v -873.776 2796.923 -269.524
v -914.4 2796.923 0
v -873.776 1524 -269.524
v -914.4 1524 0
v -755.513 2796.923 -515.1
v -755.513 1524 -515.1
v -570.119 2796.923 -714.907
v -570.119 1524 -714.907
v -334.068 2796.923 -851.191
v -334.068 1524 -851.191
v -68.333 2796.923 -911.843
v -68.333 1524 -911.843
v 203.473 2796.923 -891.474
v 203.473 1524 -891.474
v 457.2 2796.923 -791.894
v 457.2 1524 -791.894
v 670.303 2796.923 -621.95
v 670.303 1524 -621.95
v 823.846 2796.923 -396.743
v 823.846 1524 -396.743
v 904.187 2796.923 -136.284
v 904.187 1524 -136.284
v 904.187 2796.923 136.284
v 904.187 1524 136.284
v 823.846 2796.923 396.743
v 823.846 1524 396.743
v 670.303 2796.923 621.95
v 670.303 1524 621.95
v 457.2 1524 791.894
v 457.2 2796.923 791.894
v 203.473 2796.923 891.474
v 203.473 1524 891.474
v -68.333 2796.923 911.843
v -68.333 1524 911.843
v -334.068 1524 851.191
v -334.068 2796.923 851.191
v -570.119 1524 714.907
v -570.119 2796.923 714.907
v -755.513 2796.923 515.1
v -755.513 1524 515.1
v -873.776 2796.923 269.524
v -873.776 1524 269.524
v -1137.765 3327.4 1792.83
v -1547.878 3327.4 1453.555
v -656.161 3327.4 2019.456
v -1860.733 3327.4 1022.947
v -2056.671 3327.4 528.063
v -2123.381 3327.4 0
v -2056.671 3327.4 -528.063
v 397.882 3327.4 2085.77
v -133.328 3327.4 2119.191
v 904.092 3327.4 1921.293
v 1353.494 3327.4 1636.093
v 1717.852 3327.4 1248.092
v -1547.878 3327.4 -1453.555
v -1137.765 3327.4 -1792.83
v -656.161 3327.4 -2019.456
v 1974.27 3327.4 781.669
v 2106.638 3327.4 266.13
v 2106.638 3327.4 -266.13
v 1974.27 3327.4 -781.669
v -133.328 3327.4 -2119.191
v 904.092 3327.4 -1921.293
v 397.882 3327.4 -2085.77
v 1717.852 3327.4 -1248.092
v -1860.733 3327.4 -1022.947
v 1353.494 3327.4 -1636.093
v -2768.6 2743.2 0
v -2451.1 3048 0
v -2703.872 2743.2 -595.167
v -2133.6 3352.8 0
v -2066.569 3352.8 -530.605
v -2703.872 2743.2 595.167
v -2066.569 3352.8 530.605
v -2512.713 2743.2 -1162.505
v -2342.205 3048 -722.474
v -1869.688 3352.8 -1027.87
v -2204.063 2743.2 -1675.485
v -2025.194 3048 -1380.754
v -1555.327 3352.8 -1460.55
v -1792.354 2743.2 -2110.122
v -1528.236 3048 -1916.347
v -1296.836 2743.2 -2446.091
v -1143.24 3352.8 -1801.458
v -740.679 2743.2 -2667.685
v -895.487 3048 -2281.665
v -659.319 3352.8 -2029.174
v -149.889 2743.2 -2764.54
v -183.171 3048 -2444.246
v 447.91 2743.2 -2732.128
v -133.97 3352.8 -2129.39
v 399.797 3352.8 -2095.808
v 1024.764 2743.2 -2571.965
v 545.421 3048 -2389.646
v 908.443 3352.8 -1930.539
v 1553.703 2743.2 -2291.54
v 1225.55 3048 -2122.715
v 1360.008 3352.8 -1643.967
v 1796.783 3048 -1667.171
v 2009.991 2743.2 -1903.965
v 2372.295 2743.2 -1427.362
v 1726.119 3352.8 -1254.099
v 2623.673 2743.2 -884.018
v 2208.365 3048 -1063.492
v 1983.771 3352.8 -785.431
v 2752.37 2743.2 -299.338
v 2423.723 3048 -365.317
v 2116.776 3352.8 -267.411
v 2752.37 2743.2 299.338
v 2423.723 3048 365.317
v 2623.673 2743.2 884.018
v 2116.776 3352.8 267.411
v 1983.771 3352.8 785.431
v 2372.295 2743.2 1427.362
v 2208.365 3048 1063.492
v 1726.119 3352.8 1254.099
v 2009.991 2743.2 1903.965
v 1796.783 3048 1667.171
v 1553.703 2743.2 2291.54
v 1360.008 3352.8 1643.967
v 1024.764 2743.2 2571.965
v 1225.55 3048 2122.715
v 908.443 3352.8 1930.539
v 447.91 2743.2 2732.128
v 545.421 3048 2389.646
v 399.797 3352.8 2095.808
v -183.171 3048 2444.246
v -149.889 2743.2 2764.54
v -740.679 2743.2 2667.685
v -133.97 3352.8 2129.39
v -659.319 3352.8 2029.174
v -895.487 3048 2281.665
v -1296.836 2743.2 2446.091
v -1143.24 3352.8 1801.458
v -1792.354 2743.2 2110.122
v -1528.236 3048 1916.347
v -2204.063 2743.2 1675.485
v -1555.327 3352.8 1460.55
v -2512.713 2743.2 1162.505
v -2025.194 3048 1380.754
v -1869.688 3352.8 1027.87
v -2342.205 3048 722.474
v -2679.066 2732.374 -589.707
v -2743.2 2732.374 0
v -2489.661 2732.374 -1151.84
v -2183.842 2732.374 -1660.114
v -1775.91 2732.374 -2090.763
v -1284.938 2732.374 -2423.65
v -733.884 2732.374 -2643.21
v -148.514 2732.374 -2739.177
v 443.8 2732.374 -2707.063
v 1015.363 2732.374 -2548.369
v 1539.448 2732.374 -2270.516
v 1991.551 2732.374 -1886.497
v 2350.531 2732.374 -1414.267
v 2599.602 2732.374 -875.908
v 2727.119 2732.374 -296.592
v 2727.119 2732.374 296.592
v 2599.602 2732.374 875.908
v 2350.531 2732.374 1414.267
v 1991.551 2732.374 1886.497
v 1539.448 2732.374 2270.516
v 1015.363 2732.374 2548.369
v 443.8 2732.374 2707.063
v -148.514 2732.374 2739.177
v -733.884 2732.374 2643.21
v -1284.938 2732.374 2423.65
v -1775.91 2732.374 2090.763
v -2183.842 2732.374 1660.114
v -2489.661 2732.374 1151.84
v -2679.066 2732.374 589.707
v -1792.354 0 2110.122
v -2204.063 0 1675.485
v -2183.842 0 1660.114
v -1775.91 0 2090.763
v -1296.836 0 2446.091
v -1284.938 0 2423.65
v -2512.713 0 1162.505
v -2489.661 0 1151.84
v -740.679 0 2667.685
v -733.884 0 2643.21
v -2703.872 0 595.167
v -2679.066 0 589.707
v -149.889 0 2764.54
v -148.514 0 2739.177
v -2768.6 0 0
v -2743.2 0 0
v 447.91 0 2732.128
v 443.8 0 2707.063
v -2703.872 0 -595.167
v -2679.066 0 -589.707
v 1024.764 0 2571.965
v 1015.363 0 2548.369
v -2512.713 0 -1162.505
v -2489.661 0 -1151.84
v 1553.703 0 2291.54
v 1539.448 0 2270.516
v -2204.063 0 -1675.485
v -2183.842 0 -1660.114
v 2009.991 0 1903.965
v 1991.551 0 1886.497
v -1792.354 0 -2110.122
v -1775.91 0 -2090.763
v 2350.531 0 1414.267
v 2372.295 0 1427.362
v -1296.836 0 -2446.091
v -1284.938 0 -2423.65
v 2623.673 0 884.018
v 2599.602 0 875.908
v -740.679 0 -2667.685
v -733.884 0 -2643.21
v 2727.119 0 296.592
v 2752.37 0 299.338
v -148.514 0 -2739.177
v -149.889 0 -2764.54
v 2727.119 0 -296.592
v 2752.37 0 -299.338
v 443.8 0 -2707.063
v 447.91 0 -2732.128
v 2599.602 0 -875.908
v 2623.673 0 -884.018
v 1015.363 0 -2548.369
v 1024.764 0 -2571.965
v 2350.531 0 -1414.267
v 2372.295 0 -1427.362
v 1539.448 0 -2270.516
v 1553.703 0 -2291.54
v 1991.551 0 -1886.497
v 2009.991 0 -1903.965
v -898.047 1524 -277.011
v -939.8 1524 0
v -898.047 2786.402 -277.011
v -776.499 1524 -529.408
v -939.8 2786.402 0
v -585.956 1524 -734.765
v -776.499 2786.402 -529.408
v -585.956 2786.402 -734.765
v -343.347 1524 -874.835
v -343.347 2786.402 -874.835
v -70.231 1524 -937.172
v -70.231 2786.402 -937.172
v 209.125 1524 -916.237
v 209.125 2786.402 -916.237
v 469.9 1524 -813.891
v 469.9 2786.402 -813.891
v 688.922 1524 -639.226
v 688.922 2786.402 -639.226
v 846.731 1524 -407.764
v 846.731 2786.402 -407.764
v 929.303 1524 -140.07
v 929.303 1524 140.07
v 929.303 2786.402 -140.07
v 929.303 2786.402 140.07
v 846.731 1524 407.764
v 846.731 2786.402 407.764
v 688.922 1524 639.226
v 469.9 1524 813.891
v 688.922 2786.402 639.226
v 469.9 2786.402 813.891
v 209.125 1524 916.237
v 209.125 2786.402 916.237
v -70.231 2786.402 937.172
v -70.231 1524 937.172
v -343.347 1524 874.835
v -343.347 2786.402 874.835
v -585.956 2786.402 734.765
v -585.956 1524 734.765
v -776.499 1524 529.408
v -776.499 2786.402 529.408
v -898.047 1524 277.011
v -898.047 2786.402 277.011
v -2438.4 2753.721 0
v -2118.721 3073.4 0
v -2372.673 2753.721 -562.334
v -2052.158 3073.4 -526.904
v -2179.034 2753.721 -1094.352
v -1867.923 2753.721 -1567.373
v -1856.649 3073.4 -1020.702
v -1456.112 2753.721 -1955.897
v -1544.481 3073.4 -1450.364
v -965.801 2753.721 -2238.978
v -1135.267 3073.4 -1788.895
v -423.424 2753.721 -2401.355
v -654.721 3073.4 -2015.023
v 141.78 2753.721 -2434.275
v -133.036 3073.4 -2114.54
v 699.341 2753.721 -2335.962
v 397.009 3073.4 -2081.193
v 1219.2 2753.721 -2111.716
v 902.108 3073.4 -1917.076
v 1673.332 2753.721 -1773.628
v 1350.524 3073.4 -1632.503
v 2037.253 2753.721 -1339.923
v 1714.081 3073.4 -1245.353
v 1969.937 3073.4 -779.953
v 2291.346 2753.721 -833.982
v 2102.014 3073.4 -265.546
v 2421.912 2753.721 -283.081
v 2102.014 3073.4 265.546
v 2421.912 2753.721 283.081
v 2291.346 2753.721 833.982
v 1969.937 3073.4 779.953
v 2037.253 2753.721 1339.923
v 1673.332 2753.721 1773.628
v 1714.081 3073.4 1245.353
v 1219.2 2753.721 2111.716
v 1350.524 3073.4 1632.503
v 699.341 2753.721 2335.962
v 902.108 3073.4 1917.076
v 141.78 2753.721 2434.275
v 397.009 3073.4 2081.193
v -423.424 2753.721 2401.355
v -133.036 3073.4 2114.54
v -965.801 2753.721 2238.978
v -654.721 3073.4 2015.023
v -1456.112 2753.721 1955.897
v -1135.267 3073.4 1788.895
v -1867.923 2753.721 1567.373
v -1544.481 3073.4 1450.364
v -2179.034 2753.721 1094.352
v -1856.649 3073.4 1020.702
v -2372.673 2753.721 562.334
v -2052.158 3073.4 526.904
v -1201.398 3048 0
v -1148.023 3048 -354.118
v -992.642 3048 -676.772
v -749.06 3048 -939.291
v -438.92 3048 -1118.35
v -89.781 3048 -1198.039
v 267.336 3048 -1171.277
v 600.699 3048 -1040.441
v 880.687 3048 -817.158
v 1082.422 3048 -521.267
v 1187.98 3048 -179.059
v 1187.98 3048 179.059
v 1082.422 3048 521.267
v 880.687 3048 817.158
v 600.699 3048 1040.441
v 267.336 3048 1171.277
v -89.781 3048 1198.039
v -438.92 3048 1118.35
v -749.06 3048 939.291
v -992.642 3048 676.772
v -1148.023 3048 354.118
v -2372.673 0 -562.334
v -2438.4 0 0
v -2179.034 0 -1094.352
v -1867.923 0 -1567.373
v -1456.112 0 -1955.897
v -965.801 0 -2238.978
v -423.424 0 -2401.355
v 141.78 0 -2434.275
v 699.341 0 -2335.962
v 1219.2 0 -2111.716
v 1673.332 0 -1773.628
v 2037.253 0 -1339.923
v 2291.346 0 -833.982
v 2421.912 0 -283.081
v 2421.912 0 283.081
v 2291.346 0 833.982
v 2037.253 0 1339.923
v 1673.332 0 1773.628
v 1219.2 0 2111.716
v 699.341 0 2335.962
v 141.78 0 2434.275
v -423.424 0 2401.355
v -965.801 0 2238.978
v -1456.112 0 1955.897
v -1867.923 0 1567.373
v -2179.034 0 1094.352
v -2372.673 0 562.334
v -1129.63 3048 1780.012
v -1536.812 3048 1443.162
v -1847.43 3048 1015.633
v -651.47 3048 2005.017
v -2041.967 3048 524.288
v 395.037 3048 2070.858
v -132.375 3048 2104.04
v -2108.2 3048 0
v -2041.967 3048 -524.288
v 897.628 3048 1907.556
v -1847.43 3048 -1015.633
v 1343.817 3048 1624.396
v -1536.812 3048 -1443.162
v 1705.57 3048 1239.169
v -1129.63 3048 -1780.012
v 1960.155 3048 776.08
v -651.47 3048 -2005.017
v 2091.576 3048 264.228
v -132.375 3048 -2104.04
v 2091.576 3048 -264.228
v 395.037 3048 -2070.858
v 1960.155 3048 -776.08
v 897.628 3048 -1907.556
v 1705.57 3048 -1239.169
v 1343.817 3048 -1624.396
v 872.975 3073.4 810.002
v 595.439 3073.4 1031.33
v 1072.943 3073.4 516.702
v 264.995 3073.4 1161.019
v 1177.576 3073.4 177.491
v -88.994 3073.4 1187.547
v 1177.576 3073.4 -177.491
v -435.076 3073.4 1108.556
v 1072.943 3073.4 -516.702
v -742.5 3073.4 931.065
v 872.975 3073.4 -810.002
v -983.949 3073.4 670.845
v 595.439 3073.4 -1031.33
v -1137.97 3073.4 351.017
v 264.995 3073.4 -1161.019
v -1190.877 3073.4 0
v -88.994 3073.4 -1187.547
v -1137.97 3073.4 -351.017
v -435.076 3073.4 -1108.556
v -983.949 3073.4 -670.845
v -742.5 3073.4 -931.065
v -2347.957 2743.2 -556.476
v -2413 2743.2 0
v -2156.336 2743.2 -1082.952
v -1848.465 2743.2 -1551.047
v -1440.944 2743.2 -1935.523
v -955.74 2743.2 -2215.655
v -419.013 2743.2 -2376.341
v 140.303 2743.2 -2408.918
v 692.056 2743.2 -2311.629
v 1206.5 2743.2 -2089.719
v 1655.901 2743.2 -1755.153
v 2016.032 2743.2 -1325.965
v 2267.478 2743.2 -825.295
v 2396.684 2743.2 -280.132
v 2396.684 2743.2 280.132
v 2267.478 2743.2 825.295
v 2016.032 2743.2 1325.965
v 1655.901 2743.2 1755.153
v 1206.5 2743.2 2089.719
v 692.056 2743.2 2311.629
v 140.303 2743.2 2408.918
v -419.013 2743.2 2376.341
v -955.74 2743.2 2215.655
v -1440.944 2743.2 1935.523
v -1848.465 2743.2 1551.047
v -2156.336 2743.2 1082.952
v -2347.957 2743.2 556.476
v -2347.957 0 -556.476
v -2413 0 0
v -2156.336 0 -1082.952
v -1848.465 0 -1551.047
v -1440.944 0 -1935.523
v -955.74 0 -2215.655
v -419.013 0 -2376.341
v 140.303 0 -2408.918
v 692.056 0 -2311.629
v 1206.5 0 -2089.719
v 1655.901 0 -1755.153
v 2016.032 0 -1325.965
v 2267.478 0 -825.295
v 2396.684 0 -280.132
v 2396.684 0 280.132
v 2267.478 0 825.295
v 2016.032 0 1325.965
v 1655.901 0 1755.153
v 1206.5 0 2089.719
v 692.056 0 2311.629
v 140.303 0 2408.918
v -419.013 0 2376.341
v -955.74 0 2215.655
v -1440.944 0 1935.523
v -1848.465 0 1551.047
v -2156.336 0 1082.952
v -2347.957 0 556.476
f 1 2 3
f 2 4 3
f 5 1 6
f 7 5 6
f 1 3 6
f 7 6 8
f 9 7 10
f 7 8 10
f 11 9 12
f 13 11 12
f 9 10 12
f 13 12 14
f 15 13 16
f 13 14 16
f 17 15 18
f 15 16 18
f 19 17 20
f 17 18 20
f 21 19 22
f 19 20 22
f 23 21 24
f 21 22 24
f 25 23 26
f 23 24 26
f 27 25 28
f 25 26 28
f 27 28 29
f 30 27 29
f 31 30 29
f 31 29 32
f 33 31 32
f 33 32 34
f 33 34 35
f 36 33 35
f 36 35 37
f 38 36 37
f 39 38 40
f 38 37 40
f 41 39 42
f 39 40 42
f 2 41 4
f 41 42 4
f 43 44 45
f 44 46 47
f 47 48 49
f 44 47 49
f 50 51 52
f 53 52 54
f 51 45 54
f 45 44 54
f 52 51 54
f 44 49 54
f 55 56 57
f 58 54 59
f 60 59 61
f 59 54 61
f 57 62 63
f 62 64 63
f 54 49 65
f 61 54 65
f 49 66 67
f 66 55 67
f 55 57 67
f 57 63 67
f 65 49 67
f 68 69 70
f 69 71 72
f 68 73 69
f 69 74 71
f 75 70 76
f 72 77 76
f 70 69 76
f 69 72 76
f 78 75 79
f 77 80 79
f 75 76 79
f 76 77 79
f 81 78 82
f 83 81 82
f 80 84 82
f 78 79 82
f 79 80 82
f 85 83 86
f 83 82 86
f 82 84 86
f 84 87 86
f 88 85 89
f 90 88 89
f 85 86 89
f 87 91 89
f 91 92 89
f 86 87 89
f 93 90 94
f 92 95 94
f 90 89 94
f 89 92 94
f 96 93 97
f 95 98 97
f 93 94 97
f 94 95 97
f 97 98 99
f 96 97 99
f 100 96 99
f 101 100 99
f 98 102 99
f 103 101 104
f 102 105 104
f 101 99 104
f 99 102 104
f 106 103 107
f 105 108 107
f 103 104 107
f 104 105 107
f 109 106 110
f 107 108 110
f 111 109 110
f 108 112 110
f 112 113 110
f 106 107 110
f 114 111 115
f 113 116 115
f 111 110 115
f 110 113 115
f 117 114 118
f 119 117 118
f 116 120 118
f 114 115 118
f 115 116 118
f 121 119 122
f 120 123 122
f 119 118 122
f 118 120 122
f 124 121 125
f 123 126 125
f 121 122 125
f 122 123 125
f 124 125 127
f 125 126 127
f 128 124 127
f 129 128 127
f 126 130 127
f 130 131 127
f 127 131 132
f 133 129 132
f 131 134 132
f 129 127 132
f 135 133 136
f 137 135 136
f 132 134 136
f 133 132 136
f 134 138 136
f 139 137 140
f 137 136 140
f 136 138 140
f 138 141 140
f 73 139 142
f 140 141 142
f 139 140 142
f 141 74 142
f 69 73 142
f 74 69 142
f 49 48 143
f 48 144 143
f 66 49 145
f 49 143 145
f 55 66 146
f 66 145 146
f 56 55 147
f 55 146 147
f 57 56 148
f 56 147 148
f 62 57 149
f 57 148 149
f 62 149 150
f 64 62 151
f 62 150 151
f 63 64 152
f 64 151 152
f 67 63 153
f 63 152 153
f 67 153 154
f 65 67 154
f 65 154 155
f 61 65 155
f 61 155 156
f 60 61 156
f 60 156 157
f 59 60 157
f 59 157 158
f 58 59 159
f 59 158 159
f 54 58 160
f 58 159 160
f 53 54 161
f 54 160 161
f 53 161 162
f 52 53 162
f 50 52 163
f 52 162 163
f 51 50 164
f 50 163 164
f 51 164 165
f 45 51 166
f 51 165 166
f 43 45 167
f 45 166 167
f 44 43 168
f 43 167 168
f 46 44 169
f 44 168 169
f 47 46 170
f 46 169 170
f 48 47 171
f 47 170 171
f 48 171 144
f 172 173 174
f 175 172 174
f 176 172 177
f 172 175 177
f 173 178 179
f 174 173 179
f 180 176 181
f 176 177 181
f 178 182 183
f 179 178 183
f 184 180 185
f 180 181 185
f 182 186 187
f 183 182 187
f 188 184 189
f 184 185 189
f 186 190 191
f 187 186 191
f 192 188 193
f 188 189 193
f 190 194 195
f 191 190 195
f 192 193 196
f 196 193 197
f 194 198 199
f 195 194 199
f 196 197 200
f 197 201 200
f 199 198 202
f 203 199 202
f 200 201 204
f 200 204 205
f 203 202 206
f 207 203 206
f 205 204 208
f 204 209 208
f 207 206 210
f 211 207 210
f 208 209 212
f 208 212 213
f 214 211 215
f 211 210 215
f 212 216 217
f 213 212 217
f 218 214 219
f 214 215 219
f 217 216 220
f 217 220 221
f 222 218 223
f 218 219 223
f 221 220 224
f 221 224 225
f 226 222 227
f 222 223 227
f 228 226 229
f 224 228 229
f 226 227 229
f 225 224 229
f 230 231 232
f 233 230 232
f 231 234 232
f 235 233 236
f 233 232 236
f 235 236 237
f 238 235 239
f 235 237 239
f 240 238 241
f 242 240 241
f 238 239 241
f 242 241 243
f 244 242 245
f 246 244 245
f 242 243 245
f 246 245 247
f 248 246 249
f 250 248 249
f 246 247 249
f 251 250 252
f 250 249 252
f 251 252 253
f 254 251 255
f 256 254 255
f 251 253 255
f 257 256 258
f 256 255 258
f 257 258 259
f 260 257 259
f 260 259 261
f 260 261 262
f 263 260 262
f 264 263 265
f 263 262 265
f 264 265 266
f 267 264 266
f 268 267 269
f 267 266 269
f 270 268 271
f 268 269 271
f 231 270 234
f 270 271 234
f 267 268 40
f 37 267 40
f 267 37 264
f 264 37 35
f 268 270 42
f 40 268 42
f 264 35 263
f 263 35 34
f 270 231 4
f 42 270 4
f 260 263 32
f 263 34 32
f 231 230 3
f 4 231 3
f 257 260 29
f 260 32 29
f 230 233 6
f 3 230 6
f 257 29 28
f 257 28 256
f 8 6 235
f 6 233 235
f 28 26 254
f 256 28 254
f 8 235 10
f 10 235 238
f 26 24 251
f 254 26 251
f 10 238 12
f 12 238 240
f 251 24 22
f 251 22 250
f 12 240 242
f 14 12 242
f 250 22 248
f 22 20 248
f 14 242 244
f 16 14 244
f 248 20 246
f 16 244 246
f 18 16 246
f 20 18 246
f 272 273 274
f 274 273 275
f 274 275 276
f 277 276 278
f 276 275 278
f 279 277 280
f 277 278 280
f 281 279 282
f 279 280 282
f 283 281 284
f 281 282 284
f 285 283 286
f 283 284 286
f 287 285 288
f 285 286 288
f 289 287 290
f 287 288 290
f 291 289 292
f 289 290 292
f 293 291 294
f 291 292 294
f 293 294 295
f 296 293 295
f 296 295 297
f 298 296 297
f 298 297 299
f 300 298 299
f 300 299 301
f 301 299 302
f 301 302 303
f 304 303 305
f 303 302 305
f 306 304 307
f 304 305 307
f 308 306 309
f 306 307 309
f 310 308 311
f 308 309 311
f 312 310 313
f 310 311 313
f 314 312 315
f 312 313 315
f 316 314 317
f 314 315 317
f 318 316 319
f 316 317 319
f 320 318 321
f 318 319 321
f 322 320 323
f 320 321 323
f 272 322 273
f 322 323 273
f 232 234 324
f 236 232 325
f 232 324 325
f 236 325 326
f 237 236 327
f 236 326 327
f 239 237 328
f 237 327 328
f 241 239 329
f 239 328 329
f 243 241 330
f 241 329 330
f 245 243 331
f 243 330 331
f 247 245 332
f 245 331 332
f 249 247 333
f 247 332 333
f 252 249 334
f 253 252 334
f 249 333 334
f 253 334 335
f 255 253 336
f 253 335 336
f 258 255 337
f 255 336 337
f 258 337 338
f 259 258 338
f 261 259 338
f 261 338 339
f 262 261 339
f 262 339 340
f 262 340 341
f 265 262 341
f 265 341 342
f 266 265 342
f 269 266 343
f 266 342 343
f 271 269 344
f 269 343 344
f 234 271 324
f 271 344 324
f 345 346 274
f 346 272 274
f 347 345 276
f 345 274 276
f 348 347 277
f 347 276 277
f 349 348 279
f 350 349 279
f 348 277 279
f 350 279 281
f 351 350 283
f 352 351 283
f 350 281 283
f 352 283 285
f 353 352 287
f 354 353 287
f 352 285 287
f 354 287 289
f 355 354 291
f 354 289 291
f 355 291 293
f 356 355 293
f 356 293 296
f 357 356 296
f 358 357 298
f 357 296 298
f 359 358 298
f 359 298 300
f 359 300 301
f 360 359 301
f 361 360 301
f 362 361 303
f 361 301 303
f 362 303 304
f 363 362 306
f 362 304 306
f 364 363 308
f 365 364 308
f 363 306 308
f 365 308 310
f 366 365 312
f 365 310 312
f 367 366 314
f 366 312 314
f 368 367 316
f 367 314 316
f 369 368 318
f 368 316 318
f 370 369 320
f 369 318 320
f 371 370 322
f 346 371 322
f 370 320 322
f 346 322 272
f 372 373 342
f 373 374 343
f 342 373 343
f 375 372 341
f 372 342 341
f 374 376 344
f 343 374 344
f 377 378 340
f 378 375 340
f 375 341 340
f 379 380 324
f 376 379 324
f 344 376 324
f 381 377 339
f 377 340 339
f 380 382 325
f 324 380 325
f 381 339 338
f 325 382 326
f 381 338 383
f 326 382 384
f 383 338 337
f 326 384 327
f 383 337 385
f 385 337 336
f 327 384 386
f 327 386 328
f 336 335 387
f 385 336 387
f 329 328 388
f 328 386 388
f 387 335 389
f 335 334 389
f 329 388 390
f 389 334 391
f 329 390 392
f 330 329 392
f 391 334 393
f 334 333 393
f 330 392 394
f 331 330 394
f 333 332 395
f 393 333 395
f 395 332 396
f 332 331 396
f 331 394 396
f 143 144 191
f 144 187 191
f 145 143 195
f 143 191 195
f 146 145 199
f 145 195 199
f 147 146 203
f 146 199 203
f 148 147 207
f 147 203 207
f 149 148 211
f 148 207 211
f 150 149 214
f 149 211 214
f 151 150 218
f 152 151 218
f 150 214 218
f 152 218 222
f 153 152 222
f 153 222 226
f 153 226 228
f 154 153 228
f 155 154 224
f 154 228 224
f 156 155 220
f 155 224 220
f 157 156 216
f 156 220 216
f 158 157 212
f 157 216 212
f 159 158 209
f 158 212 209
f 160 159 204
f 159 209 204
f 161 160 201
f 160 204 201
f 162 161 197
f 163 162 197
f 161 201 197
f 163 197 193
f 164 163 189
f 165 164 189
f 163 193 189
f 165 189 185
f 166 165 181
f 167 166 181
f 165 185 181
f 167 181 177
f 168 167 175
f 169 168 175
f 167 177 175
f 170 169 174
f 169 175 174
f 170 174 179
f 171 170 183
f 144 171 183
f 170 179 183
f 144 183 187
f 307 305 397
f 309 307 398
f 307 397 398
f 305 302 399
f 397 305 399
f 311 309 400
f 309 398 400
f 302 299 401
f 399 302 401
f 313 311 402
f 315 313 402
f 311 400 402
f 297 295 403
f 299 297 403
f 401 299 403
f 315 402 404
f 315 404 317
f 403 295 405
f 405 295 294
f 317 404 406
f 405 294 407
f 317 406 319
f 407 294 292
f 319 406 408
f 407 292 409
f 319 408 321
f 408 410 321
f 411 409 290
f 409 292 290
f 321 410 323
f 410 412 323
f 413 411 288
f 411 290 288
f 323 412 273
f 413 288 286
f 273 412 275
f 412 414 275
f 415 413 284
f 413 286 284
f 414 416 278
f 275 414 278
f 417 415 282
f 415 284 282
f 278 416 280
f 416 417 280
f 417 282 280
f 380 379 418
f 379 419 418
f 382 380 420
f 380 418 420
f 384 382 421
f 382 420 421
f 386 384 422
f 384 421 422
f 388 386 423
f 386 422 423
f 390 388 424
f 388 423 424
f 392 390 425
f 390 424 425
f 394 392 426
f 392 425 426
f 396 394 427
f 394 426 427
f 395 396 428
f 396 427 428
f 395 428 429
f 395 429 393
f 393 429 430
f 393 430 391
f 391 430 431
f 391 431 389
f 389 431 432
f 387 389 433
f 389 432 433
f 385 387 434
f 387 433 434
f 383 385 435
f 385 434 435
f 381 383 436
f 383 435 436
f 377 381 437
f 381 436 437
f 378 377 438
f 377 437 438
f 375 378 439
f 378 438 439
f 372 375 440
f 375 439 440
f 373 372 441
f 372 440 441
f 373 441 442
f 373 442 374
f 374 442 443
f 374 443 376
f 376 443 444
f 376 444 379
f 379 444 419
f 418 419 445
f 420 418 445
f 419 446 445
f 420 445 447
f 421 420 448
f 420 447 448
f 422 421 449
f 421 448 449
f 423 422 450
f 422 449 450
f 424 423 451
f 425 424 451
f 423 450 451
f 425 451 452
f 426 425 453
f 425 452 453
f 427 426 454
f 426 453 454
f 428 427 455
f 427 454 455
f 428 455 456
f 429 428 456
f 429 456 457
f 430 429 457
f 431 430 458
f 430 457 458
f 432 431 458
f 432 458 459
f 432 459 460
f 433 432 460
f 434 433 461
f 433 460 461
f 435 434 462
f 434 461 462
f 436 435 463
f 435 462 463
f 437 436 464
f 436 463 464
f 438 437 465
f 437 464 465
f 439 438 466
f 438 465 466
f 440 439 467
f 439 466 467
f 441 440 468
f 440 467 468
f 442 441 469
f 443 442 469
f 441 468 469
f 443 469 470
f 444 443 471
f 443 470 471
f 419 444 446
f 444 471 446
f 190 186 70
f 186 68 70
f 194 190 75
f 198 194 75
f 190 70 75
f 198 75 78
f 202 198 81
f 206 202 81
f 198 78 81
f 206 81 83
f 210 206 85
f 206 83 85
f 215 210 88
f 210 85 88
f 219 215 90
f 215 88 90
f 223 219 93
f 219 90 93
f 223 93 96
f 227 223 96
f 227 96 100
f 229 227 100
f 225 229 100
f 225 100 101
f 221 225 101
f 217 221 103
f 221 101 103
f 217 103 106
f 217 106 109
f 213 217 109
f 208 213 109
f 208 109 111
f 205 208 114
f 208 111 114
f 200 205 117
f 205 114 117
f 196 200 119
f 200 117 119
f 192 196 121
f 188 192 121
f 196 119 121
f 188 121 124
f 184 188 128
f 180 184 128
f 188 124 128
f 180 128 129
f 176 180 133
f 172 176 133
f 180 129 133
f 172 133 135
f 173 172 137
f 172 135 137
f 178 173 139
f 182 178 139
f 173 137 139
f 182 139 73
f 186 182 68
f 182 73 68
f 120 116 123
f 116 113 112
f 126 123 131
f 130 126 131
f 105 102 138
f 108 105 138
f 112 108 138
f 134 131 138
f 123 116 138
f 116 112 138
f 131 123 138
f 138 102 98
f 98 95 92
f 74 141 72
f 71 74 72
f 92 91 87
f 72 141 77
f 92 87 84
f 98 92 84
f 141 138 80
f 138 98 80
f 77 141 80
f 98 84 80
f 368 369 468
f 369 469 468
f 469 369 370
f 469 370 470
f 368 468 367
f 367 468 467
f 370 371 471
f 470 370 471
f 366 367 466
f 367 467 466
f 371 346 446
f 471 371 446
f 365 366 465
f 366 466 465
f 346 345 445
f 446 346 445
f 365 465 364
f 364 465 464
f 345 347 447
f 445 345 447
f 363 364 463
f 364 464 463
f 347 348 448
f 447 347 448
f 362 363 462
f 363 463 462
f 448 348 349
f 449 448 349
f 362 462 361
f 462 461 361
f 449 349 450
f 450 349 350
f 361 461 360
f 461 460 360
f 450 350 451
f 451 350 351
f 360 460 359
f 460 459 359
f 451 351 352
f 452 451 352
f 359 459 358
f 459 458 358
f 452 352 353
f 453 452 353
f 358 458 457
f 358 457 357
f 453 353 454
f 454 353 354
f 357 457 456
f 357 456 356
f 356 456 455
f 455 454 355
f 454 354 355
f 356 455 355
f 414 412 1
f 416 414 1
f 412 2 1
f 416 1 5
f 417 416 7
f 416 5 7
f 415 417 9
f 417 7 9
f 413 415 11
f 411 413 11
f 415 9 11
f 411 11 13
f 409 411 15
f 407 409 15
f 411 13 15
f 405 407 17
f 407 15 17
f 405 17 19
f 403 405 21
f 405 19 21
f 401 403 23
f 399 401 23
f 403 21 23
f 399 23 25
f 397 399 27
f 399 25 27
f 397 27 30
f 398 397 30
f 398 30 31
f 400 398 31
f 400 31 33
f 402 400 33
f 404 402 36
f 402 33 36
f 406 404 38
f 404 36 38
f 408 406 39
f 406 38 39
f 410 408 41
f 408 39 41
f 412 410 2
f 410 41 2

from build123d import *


with BuildPart() as part:
    # Sketch1 → Revolve1 (revolve)
    with BuildSketch(Plane.XY):
        Polygon((-2438.4, 0), (-2438.4, 2753.721024484), (-2118.721024484, 3073.4), (-1190.8772065, 3073.4), (-914.4, 2796.9227935), (-914.4, 1524), (-939.8, 1524), (-939.8, 2786.401769016), (-1201.398230984, 3048), (-2108.2, 3048), (-2413, 2743.2), (-2413, 0), align=None)
    revolve(axis=Axis((0, 3520.44, 0), (0, -1, 0)))


with BuildPart() as body_2:
    # Sketch2 → Revolve2 (revolve)
    with BuildSketch(Plane.XY):
        Polygon((-2743.2, 0), (-2768.6, 0), (-2768.6, 2743.2), (-2133.6, 3352.8), (0, 3352.8), (0, 3327.4), (-2123.381318695, 3327.4), (-2743.2, 2732.374065947), align=None)
    revolve(axis=Axis((0, 3520.44, 0), (0, -1, 0)))


solid = Compound([part.part, body_2.part])
